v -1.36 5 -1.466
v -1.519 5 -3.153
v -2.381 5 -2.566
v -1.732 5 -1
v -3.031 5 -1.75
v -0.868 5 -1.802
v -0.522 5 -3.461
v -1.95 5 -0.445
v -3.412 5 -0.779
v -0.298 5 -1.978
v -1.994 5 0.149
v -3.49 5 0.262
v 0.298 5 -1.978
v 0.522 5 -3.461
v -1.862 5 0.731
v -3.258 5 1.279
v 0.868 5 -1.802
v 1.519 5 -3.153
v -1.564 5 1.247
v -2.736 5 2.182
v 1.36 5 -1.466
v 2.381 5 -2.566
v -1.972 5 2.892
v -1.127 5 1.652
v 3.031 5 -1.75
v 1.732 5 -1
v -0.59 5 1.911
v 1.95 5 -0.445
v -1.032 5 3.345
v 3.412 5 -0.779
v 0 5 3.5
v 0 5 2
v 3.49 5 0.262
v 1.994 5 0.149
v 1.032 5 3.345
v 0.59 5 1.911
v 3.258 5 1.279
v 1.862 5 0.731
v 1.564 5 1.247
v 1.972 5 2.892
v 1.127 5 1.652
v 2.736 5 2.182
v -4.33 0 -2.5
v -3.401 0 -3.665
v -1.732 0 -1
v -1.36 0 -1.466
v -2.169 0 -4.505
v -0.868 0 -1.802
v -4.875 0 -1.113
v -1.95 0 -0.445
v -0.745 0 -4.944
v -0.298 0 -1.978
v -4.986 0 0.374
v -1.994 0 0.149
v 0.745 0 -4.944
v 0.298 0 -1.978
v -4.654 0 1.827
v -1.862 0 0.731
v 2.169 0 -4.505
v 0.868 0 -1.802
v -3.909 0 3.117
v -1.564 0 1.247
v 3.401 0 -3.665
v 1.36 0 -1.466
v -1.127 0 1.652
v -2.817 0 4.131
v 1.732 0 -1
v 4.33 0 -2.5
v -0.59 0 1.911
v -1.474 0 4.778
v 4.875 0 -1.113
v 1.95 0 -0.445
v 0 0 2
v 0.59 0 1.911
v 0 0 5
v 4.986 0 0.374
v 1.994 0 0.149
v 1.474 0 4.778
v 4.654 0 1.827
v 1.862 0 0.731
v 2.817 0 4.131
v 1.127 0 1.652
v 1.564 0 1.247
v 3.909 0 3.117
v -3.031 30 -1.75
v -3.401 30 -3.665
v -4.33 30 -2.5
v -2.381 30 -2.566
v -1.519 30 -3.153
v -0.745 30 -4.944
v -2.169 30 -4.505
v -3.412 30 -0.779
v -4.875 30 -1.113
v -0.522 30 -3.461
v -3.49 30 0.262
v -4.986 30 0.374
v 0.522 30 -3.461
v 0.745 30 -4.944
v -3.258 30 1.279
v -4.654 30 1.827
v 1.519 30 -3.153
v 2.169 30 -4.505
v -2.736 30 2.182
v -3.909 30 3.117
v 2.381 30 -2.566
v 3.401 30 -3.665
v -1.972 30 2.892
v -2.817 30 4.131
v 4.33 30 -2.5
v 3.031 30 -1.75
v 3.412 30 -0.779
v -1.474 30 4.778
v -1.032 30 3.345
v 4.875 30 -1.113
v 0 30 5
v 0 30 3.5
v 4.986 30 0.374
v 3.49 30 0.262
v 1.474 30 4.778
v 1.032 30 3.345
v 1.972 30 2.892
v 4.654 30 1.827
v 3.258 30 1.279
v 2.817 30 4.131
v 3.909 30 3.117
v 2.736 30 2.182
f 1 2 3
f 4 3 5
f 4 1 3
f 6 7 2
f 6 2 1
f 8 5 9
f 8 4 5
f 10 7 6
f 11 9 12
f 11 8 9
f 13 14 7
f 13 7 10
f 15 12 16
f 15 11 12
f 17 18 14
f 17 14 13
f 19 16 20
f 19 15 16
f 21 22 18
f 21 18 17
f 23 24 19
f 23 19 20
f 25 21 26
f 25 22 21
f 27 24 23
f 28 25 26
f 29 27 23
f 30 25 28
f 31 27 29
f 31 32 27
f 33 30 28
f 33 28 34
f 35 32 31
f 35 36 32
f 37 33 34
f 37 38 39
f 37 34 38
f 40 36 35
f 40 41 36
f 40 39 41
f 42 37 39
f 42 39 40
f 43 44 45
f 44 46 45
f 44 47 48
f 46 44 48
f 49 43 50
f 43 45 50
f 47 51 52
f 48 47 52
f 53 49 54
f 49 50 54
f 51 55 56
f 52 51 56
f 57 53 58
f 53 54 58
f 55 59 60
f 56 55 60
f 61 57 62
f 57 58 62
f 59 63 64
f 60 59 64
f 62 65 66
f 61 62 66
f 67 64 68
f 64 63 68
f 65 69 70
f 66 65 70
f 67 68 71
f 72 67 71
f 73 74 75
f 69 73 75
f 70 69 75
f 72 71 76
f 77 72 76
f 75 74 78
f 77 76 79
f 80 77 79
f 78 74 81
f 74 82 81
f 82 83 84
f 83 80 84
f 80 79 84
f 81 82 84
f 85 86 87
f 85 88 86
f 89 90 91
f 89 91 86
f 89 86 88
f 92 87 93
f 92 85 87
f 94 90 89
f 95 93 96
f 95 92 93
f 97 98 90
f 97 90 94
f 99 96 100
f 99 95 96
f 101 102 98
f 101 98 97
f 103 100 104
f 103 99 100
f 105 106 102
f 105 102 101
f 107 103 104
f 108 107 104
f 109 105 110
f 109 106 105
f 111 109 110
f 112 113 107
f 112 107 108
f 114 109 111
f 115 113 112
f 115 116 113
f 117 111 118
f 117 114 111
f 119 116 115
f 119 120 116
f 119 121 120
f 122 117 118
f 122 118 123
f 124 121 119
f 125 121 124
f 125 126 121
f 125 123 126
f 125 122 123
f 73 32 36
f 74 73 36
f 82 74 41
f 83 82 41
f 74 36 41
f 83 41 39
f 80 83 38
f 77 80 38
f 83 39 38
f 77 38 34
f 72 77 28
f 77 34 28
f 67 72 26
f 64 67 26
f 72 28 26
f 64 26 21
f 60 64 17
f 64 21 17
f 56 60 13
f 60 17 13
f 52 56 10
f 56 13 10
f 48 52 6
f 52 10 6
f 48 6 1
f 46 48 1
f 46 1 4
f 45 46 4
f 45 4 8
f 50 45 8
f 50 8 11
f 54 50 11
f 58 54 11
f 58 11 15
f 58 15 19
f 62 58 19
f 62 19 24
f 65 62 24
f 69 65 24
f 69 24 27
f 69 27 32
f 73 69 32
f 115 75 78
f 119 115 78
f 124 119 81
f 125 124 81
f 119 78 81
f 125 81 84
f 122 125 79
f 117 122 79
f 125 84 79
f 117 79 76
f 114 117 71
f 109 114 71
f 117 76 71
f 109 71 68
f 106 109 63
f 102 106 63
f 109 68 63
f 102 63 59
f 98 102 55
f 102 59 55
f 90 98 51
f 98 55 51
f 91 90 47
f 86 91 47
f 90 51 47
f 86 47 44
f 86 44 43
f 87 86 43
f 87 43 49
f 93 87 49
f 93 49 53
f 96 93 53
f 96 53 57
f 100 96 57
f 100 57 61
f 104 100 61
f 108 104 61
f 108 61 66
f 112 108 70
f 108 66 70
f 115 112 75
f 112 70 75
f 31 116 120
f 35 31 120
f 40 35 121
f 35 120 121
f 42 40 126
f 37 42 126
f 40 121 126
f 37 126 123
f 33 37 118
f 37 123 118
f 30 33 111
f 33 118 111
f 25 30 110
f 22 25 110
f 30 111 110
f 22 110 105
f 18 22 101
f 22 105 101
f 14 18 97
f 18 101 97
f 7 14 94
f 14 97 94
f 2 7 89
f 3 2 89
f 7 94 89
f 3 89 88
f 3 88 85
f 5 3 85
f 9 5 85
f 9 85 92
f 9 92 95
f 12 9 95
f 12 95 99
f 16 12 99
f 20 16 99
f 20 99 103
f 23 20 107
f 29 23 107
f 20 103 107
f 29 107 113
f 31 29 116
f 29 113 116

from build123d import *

# Parameters (mm, degrees)
SKETCH1_R           = 5
BOSS_EXTRUDE1_DEPTH = 30
CUT_EXTRUDE1_REACH  = 32.822
SKETCH2_R           = 2
SKETCH3_R           = 3.5
CUT_EXTRUDE2_DEPTH  = 25


with BuildPart() as part:
    # Sketch1 → Boss-Extrude1 (new body)
    with BuildSketch(Plane(origin=(0, 0, 0), x_dir=(1, 0, 0), z_dir=(0, 1, 0))):
        with Locations(Location((0, 0, 0), (0, 0, 270))):
            Circle(SKETCH1_R)
    extrude(amount=BOSS_EXTRUDE1_DEPTH)

    # Sketch2 → Cut-Extrude1 (cut, up to next)
    with BuildSketch(Plane(origin=(0, 30, 0), x_dir=(1, 0, 0), z_dir=(0, 1, 0)), mode=Mode.PRIVATE) as cut_extrude1_sk1:
        with Locations(Location((0, 0, 0), (0, 0, 270))):
            Circle(SKETCH2_R)
    cut_extrude1_tool1 = extrude(cut_extrude1_sk1.sketch, amount=-CUT_EXTRUDE1_REACH, mode=Mode.PRIVATE) & part.part
    add(cut_extrude1_tool1.solids().sort_by_distance((0, 30, 0))[0], mode=Mode.SUBTRACT)

    # Sketch3 → Cut-Extrude2 (cut)
    with BuildSketch(Plane(origin=(0, 30, 0), x_dir=(1, 0, 0), z_dir=(0, 1, 0))):
        with Locations(Location((0, 0, 0), (0, 0, 270))):
            Circle(SKETCH3_R)
    extrude(amount=-CUT_EXTRUDE2_DEPTH, mode=Mode.SUBTRACT)


solid = part.part
